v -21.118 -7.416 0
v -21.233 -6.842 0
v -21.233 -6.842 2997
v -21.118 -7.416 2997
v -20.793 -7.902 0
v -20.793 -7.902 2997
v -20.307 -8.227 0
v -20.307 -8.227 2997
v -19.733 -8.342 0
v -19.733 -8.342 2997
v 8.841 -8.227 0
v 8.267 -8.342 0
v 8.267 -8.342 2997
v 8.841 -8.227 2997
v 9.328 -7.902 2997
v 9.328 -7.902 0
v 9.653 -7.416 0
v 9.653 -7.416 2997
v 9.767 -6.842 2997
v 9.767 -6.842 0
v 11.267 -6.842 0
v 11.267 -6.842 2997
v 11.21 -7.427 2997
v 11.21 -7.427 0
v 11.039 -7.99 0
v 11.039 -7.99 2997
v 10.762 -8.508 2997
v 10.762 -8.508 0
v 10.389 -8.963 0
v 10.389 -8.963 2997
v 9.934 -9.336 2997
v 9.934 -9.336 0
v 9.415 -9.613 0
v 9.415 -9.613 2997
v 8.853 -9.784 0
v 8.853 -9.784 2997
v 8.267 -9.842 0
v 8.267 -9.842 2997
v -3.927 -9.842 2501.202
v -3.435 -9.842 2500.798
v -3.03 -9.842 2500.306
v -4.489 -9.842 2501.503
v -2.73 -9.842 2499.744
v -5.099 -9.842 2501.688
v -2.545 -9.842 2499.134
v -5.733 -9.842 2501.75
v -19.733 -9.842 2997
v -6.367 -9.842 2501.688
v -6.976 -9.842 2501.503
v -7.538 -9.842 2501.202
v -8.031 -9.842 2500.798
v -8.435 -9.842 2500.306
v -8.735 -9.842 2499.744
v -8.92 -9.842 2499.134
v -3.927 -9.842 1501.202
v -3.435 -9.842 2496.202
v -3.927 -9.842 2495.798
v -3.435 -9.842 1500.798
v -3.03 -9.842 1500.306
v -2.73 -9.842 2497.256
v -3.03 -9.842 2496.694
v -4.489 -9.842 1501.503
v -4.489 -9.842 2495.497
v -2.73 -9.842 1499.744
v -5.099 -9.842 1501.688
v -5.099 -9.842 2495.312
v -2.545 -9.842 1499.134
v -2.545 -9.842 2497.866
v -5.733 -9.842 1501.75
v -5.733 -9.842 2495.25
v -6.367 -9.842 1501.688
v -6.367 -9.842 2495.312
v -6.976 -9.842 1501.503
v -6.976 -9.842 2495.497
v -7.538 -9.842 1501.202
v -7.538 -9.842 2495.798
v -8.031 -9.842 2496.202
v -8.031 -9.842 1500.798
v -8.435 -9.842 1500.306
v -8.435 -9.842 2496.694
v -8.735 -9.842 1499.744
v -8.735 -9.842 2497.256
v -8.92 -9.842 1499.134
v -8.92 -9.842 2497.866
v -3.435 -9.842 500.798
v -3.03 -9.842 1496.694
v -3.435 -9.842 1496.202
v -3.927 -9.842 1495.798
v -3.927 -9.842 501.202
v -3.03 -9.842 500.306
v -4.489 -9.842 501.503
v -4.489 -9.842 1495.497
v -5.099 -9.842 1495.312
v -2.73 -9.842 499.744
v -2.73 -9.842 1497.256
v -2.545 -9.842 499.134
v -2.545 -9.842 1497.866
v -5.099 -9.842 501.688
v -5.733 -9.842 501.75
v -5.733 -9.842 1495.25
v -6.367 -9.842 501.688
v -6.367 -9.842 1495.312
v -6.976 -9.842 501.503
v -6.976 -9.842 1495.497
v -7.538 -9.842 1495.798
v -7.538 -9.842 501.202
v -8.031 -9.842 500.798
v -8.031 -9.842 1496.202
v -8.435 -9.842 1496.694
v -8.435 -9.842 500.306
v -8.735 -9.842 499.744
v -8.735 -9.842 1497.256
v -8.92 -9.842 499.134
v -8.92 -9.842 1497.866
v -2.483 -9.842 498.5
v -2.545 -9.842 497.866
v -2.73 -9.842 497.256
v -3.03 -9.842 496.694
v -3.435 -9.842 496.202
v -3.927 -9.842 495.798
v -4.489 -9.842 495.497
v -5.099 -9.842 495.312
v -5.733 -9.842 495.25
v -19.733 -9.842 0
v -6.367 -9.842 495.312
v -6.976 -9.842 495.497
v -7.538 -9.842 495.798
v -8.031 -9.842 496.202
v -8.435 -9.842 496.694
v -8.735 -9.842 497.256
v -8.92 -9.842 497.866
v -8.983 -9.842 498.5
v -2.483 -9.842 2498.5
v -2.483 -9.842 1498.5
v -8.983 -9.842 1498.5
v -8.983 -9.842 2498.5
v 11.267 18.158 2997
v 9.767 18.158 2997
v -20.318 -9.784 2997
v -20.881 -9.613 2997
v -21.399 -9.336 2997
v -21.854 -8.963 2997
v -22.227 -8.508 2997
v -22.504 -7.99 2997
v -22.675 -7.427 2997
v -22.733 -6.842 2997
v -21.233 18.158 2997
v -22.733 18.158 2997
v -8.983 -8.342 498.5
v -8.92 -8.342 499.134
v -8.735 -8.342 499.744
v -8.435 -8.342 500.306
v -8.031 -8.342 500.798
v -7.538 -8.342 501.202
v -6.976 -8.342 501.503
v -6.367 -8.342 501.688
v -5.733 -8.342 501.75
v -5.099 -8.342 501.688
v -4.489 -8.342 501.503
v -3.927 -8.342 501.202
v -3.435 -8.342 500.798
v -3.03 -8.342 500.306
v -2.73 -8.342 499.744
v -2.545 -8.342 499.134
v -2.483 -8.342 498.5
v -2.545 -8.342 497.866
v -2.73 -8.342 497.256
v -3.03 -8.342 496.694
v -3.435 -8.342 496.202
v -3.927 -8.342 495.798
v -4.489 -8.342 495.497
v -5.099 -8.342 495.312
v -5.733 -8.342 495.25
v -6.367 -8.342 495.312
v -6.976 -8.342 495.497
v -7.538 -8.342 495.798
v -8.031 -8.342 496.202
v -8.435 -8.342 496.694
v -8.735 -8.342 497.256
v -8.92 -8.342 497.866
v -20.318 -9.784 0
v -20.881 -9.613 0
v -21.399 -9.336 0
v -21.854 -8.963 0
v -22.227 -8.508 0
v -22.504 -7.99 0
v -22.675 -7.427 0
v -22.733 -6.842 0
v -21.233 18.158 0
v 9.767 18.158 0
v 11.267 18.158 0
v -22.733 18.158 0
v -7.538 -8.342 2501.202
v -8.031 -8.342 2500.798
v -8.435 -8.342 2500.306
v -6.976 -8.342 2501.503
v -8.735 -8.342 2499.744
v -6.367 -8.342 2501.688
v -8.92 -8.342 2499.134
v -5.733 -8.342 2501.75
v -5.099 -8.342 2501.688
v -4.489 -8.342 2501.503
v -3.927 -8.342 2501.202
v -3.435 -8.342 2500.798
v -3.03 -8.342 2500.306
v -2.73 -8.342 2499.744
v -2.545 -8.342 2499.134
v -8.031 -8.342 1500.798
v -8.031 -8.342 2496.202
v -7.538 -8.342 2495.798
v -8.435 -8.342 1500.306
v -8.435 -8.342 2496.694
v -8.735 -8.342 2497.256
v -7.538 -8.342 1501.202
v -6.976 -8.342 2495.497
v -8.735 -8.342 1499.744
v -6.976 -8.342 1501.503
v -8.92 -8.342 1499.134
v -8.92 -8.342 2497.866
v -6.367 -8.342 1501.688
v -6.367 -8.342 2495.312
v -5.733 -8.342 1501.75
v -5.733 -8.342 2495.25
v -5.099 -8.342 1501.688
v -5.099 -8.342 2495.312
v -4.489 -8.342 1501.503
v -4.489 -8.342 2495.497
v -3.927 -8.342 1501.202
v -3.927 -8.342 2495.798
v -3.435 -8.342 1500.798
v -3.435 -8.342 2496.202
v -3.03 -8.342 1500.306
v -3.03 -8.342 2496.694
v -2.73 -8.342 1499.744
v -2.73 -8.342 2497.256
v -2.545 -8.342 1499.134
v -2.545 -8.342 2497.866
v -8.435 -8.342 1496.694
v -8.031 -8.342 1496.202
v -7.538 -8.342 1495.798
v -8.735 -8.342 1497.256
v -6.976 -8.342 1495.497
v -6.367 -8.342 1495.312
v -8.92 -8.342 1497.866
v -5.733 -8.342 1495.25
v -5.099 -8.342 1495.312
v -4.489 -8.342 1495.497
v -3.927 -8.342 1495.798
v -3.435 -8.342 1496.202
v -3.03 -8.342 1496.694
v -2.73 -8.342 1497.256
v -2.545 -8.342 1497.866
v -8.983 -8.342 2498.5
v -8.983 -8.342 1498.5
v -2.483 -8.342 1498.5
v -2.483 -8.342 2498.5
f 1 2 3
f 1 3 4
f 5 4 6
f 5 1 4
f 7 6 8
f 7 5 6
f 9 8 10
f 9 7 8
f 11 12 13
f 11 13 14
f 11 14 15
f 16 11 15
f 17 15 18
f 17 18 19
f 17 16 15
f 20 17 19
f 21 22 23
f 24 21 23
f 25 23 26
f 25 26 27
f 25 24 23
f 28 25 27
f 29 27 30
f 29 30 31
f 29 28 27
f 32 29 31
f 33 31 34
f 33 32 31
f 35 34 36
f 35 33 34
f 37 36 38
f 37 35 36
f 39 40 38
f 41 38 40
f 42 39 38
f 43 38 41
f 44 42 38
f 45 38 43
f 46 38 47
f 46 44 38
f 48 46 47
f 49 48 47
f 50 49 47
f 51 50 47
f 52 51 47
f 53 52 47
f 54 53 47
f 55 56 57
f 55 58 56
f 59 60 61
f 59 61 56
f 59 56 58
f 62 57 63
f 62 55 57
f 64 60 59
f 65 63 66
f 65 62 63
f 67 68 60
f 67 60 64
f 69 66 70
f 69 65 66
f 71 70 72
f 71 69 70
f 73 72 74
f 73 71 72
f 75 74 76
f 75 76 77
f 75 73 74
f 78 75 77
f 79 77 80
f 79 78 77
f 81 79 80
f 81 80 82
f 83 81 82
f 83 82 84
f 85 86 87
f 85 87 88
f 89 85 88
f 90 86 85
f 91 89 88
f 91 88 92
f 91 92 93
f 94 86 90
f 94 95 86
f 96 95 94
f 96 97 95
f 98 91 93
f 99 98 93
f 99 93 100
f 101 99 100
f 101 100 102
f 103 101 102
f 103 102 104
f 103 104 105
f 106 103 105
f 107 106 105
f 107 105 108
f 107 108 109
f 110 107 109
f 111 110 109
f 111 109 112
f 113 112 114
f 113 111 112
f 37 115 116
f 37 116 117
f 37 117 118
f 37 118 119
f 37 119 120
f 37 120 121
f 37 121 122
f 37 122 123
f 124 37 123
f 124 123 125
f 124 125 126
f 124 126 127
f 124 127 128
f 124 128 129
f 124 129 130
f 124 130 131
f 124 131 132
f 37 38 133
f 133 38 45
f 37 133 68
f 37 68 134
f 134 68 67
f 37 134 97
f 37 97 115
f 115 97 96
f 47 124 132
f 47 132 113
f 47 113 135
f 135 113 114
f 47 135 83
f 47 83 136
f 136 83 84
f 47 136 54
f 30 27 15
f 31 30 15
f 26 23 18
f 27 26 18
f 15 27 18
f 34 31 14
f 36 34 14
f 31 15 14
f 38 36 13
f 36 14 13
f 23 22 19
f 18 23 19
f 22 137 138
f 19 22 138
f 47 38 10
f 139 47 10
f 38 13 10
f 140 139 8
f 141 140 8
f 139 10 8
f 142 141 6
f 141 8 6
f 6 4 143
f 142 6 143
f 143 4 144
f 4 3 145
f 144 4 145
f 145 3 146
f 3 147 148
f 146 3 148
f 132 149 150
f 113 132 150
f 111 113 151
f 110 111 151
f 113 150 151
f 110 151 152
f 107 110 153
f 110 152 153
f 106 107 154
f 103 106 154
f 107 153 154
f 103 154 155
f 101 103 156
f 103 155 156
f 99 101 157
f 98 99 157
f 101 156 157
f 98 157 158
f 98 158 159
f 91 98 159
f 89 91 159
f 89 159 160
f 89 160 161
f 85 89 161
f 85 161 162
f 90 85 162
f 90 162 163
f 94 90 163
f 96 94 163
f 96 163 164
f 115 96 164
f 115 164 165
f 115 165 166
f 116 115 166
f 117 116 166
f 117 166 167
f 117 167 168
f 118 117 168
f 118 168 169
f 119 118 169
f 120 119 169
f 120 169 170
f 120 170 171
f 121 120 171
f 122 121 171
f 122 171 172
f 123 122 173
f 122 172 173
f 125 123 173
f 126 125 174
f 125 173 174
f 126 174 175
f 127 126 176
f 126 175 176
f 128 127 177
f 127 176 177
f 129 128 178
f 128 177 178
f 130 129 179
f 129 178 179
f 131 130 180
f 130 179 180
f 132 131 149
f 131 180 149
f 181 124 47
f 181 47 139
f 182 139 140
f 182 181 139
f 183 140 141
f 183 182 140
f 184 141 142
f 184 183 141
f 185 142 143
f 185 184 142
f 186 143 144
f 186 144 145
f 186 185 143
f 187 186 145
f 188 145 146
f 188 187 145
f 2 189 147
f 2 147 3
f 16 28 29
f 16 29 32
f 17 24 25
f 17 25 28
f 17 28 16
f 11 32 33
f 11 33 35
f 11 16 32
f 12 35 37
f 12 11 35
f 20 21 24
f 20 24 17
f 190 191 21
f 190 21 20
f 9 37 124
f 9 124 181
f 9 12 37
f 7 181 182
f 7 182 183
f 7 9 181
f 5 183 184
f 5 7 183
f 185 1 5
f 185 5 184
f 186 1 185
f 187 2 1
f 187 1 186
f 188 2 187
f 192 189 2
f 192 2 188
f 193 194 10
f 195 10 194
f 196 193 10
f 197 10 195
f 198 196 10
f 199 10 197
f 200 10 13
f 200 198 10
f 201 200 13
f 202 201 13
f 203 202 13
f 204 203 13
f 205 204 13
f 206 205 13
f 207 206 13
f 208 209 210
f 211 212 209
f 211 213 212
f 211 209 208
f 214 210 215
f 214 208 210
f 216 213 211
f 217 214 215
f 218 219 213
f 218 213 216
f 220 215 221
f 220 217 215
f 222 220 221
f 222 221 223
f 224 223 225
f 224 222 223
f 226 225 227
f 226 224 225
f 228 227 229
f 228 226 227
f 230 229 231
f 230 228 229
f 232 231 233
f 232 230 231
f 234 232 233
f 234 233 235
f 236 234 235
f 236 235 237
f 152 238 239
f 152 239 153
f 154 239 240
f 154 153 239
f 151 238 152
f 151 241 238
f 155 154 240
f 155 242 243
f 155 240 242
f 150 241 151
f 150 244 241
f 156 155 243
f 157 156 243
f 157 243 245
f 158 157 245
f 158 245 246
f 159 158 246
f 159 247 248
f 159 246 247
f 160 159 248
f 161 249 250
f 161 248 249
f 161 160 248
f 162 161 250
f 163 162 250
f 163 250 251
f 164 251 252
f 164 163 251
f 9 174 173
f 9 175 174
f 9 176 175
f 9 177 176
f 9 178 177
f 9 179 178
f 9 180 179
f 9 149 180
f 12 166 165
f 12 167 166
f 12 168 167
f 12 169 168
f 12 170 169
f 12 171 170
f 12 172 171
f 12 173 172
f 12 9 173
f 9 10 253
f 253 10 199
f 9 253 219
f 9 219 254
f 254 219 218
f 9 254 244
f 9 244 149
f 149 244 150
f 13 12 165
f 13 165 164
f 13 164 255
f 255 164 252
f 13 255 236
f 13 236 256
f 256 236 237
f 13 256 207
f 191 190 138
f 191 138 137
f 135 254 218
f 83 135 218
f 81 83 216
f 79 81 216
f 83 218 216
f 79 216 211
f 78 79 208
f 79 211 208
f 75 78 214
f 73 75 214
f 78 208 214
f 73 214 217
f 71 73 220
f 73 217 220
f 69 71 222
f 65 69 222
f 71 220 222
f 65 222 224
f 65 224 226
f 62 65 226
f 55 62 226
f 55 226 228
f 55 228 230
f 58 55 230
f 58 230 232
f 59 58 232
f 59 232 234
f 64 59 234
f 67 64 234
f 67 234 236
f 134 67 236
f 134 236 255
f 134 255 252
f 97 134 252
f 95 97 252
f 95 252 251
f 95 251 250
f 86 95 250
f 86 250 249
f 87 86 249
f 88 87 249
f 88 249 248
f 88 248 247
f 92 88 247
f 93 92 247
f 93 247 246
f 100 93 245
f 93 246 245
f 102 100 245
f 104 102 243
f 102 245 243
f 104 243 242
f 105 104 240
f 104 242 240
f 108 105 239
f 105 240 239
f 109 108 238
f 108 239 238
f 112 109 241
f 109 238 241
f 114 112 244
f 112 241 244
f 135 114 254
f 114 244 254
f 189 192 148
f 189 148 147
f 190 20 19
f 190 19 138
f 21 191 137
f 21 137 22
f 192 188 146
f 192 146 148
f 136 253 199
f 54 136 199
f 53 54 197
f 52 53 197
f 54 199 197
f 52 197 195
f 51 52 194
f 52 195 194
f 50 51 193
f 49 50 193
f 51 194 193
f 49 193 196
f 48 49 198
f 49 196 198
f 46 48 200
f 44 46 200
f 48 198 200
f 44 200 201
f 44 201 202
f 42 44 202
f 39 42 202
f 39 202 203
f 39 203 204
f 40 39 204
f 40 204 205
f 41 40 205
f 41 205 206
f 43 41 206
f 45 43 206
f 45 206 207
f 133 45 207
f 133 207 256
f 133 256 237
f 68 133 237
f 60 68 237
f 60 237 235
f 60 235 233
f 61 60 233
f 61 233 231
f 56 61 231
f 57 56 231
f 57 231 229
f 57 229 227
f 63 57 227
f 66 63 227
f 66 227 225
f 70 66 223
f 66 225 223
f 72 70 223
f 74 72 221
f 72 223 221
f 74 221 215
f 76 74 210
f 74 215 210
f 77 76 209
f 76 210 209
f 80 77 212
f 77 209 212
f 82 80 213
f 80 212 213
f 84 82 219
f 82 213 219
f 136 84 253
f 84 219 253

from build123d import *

# Parameters (mm, degrees)
EXTRUDE_THIN1_DEPTH = 2997
SKETCH2_R           = 3.25
CUT_EXTRUDE1_DEPTH  = 2998.203367213
LPATTERN1_COUNT     = 3
LPATTERN1_PITCH     = 1000


with BuildPart() as part:
    # Sketch1 → Extrude-Thin1 (new body)
    with BuildSketch(Plane.XY):
        with BuildLine():
            Line((11.267326733, 18.158415842), (11.267326733, -6.841584158))
            ThreePointArc((11.267326733, -6.841584158), (10.388647076, -8.962904502), (8.267326733, -9.841584158))
            Line((8.267326733, -9.841584158), (-19.732673267, -9.841584158))
            ThreePointArc((-19.732673267, -9.841584158), (-21.853993611, -8.962904502), (-22.732673267, -6.841584158))
            Line((-22.732673267, -6.841584158), (-22.732673267, 18.158415842))
            Line((-22.732673267, 18.158415842), (-21.232673267, 18.158415842))
            Line((-21.232673267, 18.158415842), (-21.232673267, -6.841584158))
            ThreePointArc((-21.232673267, -6.841584158), (-20.793333439, -7.90224433), (-19.732673267, -8.341584158))
            Line((-19.732673267, -8.341584158), (8.267326733, -8.341584158))
            ThreePointArc((8.267326733, -8.341584158), (9.327986904, -7.90224433), (9.767326733, -6.841584158))
            Line((9.767326733, -6.841584158), (9.767326733, 18.158415842))
            Line((9.767326733, 18.158415842), (11.267326733, 18.158415842))
        make_face()
    extrude(amount=EXTRUDE_THIN1_DEPTH)

    # Sketch2 → Cut-Extrude1 (cut, through all)
    with BuildSketch(Plane(origin=(0, -8.341584158, 0), x_dir=(1, 0, 0), z_dir=(0, 1, 0))):
        with Locations(Location((-5.732673267, -2498.5, 0), (0, 0, 180))):
            Circle(SKETCH2_R)
    cut_extrude1 = extrude(amount=-CUT_EXTRUDE1_DEPTH, mode=Mode.SUBTRACT)

    # LPattern1: Cut-Extrude1 ×3
    with Locations(*[(0, 0, -i * LPATTERN1_PITCH) for i in range(1, LPATTERN1_COUNT)]):
        add(cut_extrude1, mode=Mode.SUBTRACT)


solid = part.part
